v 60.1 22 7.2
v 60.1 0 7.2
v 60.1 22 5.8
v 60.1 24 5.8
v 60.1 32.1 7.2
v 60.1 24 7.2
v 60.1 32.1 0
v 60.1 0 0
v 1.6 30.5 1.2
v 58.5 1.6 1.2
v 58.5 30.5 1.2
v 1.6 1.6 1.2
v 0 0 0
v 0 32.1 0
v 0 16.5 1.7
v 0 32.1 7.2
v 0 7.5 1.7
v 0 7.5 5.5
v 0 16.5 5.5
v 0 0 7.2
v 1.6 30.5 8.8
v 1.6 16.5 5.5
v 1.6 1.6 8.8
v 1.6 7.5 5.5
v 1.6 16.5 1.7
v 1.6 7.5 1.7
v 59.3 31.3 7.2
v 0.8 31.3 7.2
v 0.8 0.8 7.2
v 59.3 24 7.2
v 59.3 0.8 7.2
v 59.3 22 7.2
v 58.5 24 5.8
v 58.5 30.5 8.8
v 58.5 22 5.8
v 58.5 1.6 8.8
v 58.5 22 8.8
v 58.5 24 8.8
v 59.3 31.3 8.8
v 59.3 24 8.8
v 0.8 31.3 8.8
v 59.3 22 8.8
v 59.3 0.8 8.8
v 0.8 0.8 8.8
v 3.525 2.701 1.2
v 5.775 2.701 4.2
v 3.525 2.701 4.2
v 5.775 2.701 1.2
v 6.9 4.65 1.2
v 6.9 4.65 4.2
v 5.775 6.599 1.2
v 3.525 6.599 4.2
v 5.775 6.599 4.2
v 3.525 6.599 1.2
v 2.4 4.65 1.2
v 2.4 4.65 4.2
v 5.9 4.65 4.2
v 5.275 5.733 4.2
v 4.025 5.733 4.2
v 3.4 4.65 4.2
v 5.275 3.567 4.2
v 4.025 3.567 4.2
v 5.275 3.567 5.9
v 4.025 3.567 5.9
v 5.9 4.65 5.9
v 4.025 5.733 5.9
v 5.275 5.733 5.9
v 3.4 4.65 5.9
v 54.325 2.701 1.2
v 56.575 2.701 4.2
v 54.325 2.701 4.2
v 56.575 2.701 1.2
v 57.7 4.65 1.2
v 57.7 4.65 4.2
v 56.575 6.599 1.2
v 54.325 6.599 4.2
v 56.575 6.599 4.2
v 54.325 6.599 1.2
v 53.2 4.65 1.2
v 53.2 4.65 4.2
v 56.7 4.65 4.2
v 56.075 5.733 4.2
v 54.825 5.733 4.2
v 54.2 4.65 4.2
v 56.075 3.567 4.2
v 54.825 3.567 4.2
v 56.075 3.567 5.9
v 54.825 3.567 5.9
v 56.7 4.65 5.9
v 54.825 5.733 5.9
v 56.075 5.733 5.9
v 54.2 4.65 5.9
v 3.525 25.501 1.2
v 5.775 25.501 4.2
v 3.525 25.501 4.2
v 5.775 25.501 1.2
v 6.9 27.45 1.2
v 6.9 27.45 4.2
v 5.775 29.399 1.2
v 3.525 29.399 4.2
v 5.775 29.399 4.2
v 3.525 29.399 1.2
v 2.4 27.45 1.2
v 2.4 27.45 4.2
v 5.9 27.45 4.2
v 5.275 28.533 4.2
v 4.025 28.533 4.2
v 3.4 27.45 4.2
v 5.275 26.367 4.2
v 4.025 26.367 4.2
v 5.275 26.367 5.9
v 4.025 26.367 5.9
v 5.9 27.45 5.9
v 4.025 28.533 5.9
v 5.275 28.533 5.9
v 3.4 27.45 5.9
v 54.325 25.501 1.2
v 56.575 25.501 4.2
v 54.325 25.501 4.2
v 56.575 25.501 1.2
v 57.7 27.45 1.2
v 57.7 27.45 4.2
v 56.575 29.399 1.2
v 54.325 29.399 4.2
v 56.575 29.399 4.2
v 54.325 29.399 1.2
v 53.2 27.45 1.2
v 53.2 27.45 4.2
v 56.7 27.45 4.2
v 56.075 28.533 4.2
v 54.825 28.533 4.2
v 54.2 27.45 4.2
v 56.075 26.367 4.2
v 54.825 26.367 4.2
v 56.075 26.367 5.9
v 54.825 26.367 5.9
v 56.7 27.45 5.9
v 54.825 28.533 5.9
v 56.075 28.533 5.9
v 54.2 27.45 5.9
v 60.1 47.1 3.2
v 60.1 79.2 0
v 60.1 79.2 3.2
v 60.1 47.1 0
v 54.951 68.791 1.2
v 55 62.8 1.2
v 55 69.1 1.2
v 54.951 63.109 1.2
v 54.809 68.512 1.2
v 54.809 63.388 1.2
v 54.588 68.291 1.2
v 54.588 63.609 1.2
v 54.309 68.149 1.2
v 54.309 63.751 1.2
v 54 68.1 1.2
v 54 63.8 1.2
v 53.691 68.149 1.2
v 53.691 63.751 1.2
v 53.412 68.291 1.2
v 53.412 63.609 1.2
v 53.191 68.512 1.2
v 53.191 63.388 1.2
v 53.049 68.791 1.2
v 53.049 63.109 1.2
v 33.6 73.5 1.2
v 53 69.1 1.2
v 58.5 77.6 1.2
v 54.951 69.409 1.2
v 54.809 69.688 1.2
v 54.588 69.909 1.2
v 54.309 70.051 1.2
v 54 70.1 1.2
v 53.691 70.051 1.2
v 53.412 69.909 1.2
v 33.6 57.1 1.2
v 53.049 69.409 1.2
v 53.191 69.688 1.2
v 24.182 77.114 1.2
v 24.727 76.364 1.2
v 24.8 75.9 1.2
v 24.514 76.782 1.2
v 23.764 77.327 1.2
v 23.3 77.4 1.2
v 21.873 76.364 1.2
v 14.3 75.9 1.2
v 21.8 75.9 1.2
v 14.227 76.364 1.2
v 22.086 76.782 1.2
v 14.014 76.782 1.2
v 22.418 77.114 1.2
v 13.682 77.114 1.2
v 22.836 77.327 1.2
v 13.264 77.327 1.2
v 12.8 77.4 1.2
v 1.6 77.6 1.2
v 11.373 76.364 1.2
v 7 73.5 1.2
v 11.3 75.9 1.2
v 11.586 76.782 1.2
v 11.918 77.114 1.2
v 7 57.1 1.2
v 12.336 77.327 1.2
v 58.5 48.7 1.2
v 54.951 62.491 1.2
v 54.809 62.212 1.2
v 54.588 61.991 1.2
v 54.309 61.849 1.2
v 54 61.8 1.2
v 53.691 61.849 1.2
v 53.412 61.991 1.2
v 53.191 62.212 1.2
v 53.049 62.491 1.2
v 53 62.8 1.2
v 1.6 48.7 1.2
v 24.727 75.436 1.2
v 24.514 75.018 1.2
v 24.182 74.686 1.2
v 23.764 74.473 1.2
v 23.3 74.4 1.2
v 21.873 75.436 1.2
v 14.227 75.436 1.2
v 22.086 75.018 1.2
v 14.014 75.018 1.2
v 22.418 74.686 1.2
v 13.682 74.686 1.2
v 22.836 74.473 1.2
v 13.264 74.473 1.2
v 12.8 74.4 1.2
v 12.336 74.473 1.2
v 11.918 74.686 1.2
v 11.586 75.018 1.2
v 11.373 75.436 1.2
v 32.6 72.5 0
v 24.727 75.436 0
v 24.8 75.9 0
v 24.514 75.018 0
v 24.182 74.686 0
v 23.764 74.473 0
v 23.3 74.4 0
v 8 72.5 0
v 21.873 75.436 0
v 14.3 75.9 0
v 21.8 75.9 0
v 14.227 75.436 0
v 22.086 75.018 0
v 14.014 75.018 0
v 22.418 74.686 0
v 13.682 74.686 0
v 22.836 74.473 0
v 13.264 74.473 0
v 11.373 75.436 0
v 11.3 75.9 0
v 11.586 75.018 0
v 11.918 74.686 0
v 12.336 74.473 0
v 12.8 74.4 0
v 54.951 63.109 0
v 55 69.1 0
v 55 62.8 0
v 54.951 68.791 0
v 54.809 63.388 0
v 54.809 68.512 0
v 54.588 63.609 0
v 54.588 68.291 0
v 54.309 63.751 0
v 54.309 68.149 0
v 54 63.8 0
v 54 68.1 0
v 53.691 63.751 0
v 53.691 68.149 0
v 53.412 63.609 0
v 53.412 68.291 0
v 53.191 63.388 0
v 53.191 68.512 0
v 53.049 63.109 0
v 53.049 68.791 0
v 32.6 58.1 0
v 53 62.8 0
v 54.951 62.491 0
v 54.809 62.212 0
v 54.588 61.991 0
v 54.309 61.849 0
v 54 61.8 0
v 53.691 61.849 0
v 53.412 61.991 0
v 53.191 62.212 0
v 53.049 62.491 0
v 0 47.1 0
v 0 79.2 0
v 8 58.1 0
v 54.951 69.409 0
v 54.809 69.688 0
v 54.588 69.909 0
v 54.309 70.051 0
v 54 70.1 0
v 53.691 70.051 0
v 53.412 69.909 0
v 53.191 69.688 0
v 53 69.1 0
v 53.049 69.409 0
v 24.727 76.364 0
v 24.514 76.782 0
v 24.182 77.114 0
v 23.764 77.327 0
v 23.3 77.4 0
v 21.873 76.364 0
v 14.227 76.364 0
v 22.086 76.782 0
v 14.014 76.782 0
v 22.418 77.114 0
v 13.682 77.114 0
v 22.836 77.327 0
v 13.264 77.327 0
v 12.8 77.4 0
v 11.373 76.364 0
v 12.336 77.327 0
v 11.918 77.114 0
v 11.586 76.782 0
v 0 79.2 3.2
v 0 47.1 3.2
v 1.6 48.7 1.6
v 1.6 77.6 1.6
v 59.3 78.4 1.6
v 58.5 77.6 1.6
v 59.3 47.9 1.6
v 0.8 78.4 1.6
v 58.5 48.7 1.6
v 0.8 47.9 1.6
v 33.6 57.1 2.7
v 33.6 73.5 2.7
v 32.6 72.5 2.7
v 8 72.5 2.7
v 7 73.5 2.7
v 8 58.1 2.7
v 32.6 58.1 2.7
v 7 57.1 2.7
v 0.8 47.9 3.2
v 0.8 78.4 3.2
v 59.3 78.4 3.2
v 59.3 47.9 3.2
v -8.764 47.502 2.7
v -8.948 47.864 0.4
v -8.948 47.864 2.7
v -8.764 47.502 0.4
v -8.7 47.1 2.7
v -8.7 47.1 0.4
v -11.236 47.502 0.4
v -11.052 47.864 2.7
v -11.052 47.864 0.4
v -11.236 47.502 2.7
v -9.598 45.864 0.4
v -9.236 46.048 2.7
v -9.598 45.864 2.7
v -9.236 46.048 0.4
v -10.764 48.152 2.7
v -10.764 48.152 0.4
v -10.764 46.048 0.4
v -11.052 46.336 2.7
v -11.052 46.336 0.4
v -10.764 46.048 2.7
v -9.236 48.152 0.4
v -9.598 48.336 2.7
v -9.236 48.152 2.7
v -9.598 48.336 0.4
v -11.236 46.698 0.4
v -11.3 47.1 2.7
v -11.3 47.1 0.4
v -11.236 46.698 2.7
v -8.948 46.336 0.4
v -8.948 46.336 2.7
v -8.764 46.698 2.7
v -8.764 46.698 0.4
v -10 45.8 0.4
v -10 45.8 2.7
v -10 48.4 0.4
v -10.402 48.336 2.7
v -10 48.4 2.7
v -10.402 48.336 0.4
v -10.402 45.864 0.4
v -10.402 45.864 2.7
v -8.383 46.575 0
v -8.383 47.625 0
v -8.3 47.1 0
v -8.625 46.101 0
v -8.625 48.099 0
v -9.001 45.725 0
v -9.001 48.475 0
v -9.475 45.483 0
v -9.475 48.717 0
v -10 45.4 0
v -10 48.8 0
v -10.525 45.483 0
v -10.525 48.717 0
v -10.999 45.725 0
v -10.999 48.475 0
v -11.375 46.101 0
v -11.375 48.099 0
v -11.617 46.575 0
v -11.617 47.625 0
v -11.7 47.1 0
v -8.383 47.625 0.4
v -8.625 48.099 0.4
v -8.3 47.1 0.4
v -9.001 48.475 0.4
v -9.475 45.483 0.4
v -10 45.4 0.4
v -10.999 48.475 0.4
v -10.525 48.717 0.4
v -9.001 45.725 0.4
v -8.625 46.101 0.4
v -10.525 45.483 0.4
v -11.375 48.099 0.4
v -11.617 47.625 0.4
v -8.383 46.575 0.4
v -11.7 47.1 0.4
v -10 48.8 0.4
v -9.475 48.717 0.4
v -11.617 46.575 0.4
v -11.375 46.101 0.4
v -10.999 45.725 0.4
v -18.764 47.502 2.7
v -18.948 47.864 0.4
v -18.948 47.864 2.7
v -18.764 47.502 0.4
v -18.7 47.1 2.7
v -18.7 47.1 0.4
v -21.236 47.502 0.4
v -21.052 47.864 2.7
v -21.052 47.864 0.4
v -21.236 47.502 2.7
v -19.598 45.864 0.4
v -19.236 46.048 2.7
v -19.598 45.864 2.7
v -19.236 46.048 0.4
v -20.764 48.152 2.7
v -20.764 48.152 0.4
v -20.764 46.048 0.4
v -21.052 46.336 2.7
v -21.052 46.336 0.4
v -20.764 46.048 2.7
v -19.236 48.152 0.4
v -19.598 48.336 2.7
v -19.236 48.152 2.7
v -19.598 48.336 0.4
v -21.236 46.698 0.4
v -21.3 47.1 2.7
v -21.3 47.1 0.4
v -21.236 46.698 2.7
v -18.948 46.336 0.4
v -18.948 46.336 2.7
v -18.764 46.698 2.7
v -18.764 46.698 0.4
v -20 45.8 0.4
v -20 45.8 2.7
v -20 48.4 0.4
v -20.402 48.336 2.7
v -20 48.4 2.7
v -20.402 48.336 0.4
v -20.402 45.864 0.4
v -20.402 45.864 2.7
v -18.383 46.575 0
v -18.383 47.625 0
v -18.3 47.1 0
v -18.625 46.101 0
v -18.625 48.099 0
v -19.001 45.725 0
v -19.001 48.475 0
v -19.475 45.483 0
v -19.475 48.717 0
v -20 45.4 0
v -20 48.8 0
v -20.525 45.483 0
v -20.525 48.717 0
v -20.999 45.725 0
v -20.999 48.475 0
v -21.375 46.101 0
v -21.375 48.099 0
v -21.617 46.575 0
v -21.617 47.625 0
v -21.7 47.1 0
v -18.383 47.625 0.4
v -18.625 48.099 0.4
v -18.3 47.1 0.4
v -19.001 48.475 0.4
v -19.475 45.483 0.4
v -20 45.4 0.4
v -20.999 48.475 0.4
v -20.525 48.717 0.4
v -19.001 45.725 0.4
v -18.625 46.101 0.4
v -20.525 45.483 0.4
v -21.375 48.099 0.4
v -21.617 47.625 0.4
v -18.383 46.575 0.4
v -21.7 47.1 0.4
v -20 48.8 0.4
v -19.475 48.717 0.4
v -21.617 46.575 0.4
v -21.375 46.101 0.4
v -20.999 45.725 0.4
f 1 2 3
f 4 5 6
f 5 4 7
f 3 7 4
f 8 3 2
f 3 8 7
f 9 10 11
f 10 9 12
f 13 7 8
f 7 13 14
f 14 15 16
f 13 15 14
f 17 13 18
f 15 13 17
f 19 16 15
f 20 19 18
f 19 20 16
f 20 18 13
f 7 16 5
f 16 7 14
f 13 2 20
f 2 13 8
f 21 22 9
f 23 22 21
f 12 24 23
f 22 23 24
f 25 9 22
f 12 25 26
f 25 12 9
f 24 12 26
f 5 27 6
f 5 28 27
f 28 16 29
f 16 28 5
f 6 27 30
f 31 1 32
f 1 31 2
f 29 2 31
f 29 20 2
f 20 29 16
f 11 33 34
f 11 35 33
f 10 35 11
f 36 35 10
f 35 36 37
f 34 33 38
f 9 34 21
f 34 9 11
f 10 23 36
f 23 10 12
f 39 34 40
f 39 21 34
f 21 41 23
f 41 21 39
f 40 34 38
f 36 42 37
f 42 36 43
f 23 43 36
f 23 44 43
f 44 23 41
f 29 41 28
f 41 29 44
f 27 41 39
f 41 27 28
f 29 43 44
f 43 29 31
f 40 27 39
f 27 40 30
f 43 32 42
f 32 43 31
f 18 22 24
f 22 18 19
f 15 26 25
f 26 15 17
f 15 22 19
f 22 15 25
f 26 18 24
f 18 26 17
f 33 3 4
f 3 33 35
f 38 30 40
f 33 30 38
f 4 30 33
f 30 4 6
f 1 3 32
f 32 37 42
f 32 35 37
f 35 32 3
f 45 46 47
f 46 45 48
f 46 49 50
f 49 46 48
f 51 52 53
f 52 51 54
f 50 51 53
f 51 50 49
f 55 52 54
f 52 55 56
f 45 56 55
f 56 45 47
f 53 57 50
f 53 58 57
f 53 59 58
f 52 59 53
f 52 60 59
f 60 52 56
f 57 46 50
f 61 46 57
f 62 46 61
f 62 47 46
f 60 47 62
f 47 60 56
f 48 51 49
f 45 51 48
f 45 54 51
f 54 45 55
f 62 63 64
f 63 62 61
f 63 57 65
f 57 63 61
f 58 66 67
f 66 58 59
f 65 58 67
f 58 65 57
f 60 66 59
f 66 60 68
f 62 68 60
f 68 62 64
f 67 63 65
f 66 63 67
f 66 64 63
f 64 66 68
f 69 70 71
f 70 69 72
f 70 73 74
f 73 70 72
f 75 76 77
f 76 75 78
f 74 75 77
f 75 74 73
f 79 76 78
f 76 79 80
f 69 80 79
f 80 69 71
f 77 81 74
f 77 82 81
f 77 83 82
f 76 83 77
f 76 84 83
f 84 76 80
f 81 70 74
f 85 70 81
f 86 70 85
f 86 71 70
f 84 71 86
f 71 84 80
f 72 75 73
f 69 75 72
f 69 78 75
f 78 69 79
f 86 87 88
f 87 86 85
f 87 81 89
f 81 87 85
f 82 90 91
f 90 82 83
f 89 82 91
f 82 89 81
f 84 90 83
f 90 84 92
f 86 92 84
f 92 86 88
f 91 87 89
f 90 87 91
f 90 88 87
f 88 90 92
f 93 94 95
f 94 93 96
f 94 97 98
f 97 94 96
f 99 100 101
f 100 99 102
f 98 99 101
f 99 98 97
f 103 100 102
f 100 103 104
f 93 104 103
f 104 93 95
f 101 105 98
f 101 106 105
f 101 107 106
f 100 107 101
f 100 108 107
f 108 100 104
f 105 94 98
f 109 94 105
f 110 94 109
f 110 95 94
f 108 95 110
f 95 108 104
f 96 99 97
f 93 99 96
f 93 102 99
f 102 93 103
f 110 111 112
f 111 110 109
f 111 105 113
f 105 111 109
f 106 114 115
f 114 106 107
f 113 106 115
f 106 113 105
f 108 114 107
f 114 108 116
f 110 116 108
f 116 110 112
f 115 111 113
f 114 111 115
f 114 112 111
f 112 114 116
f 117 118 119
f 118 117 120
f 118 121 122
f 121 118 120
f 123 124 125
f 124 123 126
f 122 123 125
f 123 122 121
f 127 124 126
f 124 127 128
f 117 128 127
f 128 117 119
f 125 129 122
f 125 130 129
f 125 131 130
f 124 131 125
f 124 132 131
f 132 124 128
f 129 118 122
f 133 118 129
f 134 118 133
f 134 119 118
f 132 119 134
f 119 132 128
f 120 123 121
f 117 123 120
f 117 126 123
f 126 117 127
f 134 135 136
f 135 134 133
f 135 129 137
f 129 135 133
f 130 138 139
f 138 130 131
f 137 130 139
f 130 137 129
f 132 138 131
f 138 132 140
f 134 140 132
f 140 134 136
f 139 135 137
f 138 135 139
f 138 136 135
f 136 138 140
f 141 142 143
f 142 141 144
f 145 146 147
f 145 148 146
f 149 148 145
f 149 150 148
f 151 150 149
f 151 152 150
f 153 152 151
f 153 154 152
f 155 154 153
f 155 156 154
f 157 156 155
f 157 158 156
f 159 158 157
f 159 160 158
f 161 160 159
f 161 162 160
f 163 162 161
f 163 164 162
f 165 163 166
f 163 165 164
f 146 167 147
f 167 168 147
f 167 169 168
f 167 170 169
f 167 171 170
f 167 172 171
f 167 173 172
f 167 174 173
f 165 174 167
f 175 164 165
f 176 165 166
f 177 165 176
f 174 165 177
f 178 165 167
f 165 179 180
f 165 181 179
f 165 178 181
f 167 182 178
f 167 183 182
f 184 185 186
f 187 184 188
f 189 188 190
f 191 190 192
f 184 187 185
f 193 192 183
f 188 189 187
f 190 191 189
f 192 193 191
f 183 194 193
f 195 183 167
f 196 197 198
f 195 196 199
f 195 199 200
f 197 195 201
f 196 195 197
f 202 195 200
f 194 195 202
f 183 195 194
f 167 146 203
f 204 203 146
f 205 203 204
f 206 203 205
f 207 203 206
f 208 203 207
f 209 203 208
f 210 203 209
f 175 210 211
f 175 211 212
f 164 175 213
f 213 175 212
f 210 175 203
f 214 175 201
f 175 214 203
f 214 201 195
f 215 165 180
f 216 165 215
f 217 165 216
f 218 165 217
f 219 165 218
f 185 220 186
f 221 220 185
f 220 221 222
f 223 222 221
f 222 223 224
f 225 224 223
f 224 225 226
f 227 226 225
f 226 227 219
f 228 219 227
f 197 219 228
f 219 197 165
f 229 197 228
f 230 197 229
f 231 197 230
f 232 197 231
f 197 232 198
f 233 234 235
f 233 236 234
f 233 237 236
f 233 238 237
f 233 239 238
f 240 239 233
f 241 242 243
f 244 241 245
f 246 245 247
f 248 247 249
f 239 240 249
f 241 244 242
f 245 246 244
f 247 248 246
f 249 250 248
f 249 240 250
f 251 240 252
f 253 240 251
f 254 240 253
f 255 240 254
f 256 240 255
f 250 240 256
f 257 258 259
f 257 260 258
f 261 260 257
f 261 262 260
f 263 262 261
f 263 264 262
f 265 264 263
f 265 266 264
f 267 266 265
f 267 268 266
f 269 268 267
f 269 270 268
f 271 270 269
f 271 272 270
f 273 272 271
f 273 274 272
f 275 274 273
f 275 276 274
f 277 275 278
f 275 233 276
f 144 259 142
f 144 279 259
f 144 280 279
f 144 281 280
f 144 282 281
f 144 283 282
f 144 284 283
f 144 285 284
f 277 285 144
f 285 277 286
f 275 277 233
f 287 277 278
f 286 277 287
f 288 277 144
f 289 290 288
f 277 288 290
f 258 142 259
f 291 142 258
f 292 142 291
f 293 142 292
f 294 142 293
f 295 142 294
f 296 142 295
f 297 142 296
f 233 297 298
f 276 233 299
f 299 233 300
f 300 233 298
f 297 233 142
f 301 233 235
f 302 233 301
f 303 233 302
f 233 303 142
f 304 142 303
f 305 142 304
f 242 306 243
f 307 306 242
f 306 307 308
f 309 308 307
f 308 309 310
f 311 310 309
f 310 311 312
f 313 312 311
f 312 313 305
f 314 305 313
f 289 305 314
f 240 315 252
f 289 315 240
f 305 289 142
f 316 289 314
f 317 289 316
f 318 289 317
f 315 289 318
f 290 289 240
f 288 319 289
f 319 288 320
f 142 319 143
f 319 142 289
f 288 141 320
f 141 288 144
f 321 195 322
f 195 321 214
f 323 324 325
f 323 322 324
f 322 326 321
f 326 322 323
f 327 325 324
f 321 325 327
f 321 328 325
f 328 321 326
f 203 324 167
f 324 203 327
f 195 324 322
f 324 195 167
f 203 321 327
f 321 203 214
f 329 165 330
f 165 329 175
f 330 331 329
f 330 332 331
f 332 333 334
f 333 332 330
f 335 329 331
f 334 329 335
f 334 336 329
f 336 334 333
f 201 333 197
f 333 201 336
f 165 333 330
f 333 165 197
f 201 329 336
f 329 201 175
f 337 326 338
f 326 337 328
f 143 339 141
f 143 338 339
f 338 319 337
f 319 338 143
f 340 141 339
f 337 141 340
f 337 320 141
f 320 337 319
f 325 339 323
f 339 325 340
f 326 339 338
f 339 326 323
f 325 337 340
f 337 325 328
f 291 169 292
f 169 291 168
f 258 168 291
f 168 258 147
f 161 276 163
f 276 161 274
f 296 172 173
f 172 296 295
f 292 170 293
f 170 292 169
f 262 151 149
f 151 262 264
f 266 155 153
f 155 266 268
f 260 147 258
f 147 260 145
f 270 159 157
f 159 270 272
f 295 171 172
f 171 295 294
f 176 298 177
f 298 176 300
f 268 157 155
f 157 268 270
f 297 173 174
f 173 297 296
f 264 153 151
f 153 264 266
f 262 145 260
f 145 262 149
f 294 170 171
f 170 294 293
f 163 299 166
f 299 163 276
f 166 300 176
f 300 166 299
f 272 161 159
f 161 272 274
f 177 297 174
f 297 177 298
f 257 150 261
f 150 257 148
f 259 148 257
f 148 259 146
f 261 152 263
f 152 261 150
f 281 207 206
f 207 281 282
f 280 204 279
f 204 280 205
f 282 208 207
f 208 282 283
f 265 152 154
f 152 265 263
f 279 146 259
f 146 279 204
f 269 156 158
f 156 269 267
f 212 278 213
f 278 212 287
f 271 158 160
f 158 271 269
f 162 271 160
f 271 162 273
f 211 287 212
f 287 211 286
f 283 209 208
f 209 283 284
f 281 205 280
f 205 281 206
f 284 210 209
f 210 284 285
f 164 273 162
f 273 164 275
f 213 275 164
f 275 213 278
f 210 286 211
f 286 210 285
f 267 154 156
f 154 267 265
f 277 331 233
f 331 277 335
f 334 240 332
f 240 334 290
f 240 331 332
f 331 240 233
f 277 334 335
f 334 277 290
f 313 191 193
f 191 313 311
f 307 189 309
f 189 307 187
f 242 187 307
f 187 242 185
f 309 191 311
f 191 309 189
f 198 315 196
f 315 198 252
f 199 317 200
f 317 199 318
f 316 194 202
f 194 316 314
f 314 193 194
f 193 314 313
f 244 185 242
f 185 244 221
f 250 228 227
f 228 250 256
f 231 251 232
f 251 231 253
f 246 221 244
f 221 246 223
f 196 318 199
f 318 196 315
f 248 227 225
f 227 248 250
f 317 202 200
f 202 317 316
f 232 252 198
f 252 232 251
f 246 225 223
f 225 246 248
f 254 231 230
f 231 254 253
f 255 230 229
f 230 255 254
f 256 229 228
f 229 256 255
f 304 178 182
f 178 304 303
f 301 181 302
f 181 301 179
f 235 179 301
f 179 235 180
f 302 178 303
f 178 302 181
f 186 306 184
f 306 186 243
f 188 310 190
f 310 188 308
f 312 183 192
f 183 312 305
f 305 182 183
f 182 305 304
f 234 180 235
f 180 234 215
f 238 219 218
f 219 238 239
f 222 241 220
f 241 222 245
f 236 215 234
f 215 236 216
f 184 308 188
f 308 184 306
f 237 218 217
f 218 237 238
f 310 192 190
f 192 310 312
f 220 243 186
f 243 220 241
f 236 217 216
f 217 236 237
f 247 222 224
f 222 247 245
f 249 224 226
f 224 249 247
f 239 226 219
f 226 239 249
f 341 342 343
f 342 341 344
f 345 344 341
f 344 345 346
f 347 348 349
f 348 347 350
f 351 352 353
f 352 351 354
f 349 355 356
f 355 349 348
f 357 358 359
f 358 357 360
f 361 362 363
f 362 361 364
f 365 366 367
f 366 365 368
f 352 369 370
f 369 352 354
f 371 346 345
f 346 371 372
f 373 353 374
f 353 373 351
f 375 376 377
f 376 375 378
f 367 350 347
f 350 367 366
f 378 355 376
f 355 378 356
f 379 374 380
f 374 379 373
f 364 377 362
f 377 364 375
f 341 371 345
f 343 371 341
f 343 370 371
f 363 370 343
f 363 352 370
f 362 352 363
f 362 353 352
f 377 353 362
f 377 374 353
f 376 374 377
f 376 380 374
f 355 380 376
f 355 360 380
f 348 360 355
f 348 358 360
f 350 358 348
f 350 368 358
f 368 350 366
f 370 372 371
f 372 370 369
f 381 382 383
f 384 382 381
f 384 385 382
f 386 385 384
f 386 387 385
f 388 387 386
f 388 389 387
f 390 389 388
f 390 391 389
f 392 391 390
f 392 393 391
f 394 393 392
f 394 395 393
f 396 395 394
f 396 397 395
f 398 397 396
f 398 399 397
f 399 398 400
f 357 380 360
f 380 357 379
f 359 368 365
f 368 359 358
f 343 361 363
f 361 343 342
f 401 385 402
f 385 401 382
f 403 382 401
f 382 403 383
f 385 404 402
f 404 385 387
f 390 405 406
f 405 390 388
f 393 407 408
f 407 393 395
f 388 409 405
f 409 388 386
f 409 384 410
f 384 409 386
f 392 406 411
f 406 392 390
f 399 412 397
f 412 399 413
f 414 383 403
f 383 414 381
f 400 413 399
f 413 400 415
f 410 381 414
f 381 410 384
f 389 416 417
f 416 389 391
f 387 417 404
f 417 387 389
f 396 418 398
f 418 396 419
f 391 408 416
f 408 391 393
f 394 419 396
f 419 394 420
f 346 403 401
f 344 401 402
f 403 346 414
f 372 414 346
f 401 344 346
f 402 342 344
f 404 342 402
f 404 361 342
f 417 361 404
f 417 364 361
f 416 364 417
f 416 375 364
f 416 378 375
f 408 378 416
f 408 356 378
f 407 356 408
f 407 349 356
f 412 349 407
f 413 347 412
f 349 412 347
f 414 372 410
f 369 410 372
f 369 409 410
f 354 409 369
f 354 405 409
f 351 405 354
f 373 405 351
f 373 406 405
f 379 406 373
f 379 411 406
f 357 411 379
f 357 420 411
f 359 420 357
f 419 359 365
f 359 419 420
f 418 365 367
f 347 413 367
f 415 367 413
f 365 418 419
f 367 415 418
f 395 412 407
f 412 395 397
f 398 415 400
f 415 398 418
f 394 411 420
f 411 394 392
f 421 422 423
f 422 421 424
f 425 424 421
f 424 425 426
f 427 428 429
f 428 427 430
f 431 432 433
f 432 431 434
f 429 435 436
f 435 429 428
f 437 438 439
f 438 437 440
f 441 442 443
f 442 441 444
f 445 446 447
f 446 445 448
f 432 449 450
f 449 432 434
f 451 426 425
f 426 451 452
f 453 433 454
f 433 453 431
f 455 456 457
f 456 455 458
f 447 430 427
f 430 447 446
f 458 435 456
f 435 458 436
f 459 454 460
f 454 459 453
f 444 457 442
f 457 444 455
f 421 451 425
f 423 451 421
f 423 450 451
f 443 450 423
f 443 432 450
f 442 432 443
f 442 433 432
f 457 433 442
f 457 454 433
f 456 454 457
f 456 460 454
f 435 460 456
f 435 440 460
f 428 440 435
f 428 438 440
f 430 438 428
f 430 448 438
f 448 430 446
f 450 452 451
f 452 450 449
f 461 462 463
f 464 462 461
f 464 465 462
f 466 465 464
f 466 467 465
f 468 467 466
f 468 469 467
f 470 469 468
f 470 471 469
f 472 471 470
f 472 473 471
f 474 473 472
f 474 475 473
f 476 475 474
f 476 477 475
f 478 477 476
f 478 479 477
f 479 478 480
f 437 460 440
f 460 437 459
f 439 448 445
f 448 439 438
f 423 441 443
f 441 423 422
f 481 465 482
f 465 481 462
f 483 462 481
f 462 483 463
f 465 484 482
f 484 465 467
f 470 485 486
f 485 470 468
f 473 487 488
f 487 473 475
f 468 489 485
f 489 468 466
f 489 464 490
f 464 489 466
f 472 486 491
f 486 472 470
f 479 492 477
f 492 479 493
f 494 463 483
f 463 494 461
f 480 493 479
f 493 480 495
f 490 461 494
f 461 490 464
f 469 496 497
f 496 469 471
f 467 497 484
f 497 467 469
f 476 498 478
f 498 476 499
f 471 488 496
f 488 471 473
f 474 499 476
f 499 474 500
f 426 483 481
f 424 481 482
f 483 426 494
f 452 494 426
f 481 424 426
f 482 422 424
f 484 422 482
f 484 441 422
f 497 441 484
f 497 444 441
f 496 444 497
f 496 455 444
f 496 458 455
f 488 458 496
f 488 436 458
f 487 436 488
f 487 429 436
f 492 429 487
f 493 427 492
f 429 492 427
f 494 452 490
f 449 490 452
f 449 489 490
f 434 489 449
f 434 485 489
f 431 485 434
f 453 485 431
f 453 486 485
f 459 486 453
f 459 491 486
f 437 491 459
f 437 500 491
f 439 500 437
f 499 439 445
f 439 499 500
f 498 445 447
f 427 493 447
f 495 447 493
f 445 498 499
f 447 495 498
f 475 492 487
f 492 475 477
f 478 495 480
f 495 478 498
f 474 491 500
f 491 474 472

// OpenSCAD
// This design is parameterized based on holes in a PCB.
// It assumes that the PCB has 4 holes, evenly spaced as
// corners of a rectangle.

// Note: width refers to X axis, depth to Y, height to Z
bottom = true;
top = true;
usb = true;
reset= true;
flash= true;
leds = true;
buttons = true;
// Edit these parameters for your own board dimensions
wall_thickness = 1.6;
floor_thickness = 1.2;
ceiling_thickness = 1.2;

bottom_wall_height = 6;
top_wall_height = 2;

window_x = 24.6;
window_y = 14.4;
window_ridge = 2;
window_ridge_height = 1.5;
// Total height of box = floor_thickness + ceiling_thickness + bottom_wall_height + top_wall_height

hole_spacing_x = 50.8;
hole_spacing_y = 22.8;

hole_diameter = 2.5;
standoff_diameter = 4.5;
standoff_top = false;

// How much the PCB needs to be raised from the bottom
// to leave room for solderings and whatnot
standoff_height = 3;
board_thickness = 1.6;
facets = 6;

// padding between standoff and wall
padding_left = 0.8;
padding_right = 0.8;
padding_back = 0.8;
padding_front = 0.8;

// ridge where bottom and top off box can overlap
// Make sure this isn't less than top_wall_height
ridge_height = 1.6;

//-------------------------------------------------------------------

// Calculated globals
module case_buttons() {
    cylinder(h=ceiling_thickness+window_ridge_height, r=1.3, center=false, $fn=20);
    cylinder(h=window_ridge_height-1.1, r=1.7, center=false, $fn=20);
    
}

module ceilingless_box(width, depth, height) {
    // Floor
    cube([width, depth, floor_thickness]);
    
    // Left wall
    translate([0, 0, floor_thickness])
        cube([
            wall_thickness,
            depth,
            height]);
    
    // Right wall
    translate([width - wall_thickness, 0, floor_thickness])
        cube([
            wall_thickness,
            depth,
            height]);
    
    // Rear wall
    translate([wall_thickness, depth - wall_thickness, floor_thickness])
        cube([
            width - 2 * wall_thickness,
            wall_thickness,
            height]);
    
    // Front wall
    translate([wall_thickness, 0, floor_thickness])
        cube([
            width - 2 * wall_thickness,
            wall_thickness,
            height]);
}

module bottom_case() {
    floor_width = hole_spacing_x + standoff_diameter + padding_left + padding_right + wall_thickness * 2;
    floor_depth = hole_spacing_y + standoff_diameter + padding_front + padding_back + wall_thickness * 2;
    
    module box() {
        ceilingless_box(floor_width, floor_depth, bottom_wall_height);        
        
        // Left Ridge
        translate([
            wall_thickness / 2,
            wall_thickness / 2,
            floor_thickness + bottom_wall_height])
            cube([
                wall_thickness / 2,
                floor_depth - wall_thickness,
                ridge_height]);
        
        
        // Right Ridge
        translate([
            floor_width - wall_thickness,
            wall_thickness / 2,
            floor_thickness + bottom_wall_height])
            cube([
                wall_thickness / 2,
                floor_depth - wall_thickness,
                ridge_height]);
                
        // Rear Ridge
        translate([
            wall_thickness,
            floor_depth - wall_thickness,
            floor_thickness + bottom_wall_height])
            cube([
                floor_width - wall_thickness * 2,
                wall_thickness / 2,
                ridge_height]);
                
        // Front Ridge
        translate([
            wall_thickness,
            wall_thickness / 2,
            floor_thickness + bottom_wall_height])
            cube([
                floor_width - 2 * wall_thickness,
                wall_thickness / 2,
                ridge_height
            ]);
    }
        
    
    // Place the standoffs and through-PCB pins in the box
    module pcb_holder() {        
        base_offset_x = wall_thickness + padding_left + standoff_diameter / 2;
        base_offset_y = wall_thickness + padding_front + standoff_diameter / 2;
        
        module pin() {
            // Standoff
            translate([0, 0,  standoff_height / 2])
                cylinder(
                    r = standoff_diameter / 2,
                    h = standoff_height,
                    center = true,
                    $fn = facets);
            
            // Through-PCB pin
            translate([0, 0, 3.6])
                cylinder(
                    r = (hole_diameter / 2),
                    h = (board_thickness + 0.6),
                    center = true,
                    $fn = facets);
        }
        
        // Front left
        translate([base_offset_x, base_offset_y, floor_thickness])
            pin();
        
        // Front right
        translate([base_offset_x + hole_spacing_x, base_offset_y, floor_thickness])
            pin();
        
        // Rear left
        translate([base_offset_x, base_offset_y + hole_spacing_y, floor_thickness])
            pin();
        
        // Rear right
        translate([base_offset_x + hole_spacing_x, base_offset_y + hole_spacing_y, floor_thickness])
            pin();
        
    }
    if (usb == true)
    {
    difference () {
        box();
        translate([0, 7.5, floor_thickness+0.5])  cube([3, 9, 3.8]);//usb
        translate([floor_width-wall_thickness*2, 22, floor_thickness+bottom_wall_height-1.4])  cube([wall_thickness*2, 2, 4]);    //antenna
        }
    } else box();
    pcb_holder();
}

module top_case() {
    floor_width = hole_spacing_x + standoff_diameter + padding_left + padding_right + wall_thickness * 2;
    floor_depth = hole_spacing_y + standoff_diameter + padding_front + padding_back + wall_thickness * 2;
    
    module box() {
        ceilingless_box(floor_width, floor_depth, top_wall_height - ridge_height);
        translate([7, 10, ceiling_thickness])  cube([window_x+window_ridge, window_y+window_ridge, window_ridge_height]);

        // Left Ridge
        translate([
            0,
            0,
            floor_thickness + top_wall_height - ridge_height])
            cube([
                wall_thickness / 2,
                floor_depth,
                ridge_height]);
        
        
        // Right Ridge
        translate([
            floor_width - wall_thickness / 2,
            0,
            floor_thickness + top_wall_height - ridge_height])
            cube([
                wall_thickness / 2,
                floor_depth,
                ridge_height]);
                
        // Rear Ridge
        translate([
            wall_thickness / 2,
            floor_depth - wall_thickness / 2,
            floor_thickness + top_wall_height - ridge_height])
            cube([
                floor_width - wall_thickness,
                wall_thickness / 2,
                ridge_height]);
                
        // Front Ridge
        translate([
            wall_thickness / 2,
            0,
            floor_thickness + top_wall_height - ridge_height])
            cube([
                floor_width - wall_thickness,
                wall_thickness / 2,
                ridge_height
            ]);        
    }
    
    module pcb_holder() {
        base_offset_x = wall_thickness + padding_left + standoff_diameter / 2;
        base_offset_y = wall_thickness + padding_back + standoff_diameter / 2;
        
        module pin_receiver() {
           if (standoff_top == true)
           {
               cylinder(
                        r = (standoff_diameter / 2),
                        h = standoff_height,
                        center = false,
                        $fn = facets);
           }
        }
        
        // Keep in mind that this part needs to be turned over to get the correct
        // orientation. In the design, the rear left here looks like the front left.
        
        // Rear left
        translate([base_offset_x, base_offset_y, floor_thickness])
            pin_receiver();
        
        // Rear right
        translate([base_offset_x + hole_spacing_x, base_offset_y, floor_thickness])
            pin_receiver();
        
        // Front left
        translate([base_offset_x, base_offset_y + hole_spacing_y, floor_thickness])
            pin_receiver();
        
        // Front right
        translate([base_offset_x + hole_spacing_x, base_offset_y + hole_spacing_y, floor_thickness])
            pin_receiver();
    }
    
    
    difference () {
        box();
        translate([8, 11, -5])  cube([window_x, window_y, 10]);
        if (reset==true)
            translate([12.8, 28.8,  0]) //reset
                    cylinder(
                        r = 1.5,
                        h = 4,
                        center = true,
                        $fn = 20);
            
        if (flash==true)
            translate([12.8+10.5, 28.8,  0]) //flash
                    cylinder(
                        r = 1.5,
                        h = 4,
                        center = true,
                        $fn = 20);
    
        if (leds==true){
            translate([54, 22,  0]) //led 1
                    cylinder(
                        r = 1,
                        h = 4,
                        center = true,
                        $fn = 20);
            
            translate([54, 15.7,  0]) //led2
                    cylinder(
                        r = 1,
                        h = 4,
                        center = true,
                        $fn = 20);
        }
    }
        
    pcb_holder();
    
}


if (bottom == true) bottom_case();
if (top == true) 
{
translate([
    0,
    15 + hole_spacing_y + standoff_diameter + padding_front + padding_back + wall_thickness * 2,
    0])
    top_case();
}
if(buttons==true) {
    if(reset) translate([-10,
        15 + hole_spacing_y + standoff_diameter + padding_front + padding_back +    wall_thickness * 2,0]) 
        case_buttons();
    if(flash) translate([-20,
        15 + hole_spacing_y + standoff_diameter + padding_front + padding_back + wall_thickness * 2,0]) 
        case_buttons();
}
